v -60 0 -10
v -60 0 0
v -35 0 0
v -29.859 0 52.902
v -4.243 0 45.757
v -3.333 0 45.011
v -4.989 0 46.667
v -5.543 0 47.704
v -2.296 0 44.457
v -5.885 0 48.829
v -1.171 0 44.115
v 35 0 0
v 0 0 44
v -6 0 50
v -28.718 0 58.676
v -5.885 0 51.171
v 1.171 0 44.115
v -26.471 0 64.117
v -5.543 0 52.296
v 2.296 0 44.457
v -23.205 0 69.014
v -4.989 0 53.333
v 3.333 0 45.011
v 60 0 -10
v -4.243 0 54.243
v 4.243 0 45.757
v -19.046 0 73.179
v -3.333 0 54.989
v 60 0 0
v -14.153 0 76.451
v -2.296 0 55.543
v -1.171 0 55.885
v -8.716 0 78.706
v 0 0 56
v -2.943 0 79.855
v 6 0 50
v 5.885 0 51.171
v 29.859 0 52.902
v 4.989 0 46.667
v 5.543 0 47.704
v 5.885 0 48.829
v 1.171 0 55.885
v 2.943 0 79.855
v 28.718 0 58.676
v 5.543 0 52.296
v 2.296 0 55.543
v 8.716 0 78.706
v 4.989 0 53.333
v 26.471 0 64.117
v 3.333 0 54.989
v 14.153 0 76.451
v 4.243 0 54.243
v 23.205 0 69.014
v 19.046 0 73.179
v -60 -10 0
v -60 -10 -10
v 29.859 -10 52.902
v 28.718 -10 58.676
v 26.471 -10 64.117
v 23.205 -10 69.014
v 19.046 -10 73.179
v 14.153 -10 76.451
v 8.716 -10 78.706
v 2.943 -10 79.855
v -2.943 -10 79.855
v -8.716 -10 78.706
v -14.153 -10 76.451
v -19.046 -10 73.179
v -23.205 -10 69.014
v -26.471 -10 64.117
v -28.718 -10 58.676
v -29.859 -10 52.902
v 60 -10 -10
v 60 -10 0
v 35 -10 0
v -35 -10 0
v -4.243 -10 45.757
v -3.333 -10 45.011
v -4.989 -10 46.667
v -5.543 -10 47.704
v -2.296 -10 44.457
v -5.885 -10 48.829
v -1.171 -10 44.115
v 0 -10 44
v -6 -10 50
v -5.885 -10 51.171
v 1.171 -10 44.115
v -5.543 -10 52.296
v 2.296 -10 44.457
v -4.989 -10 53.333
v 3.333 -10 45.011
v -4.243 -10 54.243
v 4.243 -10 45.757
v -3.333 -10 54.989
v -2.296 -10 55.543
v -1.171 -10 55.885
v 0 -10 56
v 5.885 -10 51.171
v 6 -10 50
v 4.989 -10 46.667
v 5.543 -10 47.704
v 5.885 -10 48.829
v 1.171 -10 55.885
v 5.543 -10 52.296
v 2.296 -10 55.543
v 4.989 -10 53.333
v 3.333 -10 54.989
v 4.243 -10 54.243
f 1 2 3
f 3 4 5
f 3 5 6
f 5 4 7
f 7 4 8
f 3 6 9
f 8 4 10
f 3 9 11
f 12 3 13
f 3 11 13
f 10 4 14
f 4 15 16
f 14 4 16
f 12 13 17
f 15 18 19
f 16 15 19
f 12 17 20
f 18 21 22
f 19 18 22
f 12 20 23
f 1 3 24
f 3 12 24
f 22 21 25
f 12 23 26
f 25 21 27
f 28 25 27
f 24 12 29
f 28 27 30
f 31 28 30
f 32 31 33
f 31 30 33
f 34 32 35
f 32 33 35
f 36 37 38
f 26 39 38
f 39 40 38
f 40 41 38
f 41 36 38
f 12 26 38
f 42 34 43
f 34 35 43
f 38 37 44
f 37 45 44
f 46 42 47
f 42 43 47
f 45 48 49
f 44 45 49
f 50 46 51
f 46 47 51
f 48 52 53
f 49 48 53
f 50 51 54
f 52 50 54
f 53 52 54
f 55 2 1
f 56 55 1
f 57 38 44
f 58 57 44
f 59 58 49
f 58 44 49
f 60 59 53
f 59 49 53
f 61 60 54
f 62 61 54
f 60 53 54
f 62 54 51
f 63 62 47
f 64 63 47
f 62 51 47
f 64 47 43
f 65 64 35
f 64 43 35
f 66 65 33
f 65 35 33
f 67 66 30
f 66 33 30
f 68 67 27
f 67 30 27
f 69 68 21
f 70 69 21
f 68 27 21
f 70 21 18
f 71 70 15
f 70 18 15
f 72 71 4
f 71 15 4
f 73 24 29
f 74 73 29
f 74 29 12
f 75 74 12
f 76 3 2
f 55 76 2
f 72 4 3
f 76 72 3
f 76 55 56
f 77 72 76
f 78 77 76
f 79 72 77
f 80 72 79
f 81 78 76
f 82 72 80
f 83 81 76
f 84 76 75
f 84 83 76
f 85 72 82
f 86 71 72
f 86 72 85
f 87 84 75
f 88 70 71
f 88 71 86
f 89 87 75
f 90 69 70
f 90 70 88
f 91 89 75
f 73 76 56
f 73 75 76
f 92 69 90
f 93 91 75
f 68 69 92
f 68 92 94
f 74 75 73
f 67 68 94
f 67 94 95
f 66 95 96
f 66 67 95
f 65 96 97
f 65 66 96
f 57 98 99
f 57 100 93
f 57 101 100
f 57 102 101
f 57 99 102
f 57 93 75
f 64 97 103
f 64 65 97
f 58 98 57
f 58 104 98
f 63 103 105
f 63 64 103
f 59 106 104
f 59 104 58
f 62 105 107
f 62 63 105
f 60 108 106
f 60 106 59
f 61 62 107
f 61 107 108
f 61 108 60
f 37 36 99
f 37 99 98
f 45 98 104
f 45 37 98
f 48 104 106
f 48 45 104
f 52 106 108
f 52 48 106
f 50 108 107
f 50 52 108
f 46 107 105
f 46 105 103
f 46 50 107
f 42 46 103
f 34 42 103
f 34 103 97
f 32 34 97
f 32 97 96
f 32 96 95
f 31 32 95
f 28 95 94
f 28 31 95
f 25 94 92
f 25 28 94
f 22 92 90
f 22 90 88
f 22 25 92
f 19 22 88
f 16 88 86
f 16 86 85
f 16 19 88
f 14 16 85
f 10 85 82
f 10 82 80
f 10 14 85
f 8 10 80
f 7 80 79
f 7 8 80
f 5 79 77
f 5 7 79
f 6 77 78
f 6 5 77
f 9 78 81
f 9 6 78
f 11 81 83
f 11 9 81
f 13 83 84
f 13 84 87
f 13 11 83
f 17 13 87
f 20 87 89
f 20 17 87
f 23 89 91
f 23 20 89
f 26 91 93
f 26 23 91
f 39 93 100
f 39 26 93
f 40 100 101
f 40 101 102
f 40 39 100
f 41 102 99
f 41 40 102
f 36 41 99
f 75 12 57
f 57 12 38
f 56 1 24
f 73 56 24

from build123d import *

# Parameters (mm, degrees)
F0_R     = 6
F1_DEPTH = 10


with BuildPart() as f1:
    # F0 (on Front) → F1 (new body)
    with BuildSketch(Plane.XZ):
        with BuildLine():
            Line((35, 0), (29.859354, 52.901548))
            ThreePointArc((29.859354, 52.901548), (0, 80), (-29.859354, 52.901548))
            Line((-29.859354, 52.901548), (-35, 0))
            Line((-35, 0), (-60, 0))
            Line((-60, 0), (-60, -10))
            Line((-60, -10), (60, -10))
            Line((60, -10), (60, 0))
            Line((60, 0), (35, 0))
        make_face()
        with Locations((0, 50)):
            Circle(F0_R, mode=Mode.SUBTRACT)
    extrude(amount=F1_DEPTH)


solid = f1.part
